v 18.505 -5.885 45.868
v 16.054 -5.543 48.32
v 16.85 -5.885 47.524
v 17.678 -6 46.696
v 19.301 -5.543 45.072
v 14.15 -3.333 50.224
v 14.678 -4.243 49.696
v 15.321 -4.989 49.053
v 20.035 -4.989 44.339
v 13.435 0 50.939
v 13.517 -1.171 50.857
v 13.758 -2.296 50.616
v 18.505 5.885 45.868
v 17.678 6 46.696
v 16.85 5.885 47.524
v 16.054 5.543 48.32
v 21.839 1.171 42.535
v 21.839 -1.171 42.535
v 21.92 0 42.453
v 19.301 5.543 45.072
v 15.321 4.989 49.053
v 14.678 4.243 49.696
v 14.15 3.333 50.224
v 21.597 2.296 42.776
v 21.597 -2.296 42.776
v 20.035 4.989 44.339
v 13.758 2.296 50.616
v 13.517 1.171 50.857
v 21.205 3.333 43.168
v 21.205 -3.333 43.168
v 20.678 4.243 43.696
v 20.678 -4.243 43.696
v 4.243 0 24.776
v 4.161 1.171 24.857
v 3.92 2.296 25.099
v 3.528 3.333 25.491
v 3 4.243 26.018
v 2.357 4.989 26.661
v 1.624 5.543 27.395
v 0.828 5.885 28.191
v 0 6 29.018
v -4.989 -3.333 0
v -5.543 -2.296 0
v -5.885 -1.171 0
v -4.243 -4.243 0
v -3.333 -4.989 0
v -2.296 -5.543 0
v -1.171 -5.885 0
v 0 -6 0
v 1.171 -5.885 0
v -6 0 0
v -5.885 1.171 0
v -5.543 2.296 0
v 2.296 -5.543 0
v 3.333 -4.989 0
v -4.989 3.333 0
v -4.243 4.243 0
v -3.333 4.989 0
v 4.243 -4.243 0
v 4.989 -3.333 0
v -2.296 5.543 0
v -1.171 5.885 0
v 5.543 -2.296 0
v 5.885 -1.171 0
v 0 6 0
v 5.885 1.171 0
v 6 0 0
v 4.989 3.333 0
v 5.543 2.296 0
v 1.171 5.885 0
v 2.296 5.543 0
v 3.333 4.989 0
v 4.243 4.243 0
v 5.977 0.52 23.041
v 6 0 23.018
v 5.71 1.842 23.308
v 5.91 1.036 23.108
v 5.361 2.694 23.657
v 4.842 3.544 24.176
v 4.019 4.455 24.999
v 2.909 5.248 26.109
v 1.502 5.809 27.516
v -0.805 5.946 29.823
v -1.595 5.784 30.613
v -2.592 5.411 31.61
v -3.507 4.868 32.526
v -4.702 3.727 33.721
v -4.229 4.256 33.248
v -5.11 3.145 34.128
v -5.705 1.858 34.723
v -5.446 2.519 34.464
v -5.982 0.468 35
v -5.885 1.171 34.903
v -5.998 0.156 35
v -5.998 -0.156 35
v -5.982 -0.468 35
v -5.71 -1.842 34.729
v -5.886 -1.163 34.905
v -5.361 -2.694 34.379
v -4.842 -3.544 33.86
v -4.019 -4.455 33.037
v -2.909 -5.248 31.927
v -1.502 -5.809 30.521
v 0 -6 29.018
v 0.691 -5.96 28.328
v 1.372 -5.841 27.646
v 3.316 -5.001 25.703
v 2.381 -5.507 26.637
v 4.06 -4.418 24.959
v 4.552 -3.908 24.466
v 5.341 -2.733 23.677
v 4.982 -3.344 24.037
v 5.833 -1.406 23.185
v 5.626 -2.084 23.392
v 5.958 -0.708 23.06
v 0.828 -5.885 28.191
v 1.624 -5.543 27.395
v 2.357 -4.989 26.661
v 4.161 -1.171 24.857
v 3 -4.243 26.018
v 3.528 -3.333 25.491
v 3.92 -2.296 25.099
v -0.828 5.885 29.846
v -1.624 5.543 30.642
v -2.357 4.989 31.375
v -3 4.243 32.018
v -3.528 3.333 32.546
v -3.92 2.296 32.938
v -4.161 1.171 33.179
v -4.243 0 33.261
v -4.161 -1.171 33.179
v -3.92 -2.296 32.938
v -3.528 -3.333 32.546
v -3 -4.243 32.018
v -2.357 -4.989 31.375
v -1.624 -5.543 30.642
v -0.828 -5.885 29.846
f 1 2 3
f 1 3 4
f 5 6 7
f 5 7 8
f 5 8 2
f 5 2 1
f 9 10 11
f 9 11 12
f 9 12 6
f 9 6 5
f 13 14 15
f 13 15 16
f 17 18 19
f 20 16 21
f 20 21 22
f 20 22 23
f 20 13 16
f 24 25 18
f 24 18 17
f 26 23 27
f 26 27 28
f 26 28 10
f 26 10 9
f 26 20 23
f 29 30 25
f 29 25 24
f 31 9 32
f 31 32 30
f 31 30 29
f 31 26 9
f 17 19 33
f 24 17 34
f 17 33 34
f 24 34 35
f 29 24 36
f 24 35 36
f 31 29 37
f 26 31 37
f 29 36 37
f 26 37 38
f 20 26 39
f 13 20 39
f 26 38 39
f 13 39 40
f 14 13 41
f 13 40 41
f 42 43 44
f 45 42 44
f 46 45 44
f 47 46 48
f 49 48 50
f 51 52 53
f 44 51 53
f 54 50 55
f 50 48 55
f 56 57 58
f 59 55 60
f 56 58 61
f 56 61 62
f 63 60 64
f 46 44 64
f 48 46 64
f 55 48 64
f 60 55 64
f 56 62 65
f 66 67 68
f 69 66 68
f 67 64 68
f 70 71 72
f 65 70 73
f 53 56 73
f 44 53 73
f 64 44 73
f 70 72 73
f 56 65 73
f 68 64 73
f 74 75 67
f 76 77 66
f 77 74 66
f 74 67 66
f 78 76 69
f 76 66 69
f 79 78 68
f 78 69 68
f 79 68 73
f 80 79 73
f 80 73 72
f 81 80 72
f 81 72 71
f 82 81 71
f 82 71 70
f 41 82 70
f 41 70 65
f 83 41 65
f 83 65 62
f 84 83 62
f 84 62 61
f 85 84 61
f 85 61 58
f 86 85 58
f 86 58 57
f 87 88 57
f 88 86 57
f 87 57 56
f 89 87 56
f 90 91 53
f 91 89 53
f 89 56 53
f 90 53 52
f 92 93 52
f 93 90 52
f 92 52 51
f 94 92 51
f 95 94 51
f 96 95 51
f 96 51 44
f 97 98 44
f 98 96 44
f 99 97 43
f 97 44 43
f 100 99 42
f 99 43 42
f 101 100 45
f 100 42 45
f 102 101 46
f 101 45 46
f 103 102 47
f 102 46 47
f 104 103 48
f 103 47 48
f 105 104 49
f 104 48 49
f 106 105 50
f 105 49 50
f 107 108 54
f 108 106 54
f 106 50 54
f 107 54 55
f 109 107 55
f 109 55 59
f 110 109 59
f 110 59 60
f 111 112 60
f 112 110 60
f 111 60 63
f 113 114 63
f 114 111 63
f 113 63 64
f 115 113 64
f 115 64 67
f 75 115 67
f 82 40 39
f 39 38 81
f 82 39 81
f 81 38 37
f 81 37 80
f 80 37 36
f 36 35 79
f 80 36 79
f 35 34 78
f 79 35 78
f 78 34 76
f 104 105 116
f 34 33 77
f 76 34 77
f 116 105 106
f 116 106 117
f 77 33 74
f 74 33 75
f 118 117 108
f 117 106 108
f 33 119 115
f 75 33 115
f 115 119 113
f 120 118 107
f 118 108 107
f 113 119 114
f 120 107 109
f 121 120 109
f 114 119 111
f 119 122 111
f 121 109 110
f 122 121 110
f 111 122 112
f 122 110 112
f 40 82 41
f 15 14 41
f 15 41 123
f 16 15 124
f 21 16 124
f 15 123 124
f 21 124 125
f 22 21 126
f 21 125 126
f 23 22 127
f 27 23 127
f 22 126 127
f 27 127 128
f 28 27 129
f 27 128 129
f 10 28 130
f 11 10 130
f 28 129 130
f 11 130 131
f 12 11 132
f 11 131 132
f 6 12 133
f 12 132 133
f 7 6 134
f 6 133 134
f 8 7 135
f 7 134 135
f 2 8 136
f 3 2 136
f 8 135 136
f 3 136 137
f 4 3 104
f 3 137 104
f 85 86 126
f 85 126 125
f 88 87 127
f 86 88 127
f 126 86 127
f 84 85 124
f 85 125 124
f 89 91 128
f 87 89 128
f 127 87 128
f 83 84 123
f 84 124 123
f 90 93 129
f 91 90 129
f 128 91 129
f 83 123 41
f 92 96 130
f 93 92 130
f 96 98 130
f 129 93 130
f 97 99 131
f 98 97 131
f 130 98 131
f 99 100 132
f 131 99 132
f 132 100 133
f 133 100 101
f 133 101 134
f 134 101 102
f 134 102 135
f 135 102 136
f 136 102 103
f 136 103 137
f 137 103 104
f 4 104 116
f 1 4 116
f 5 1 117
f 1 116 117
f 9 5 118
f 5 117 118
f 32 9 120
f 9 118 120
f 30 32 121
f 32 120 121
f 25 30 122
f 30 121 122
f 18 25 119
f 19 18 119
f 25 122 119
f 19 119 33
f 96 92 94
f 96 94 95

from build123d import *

# Parameters (mm, degrees)
F0_R     = 6
F1_DEPTH = 35
F3_DEPTH = 12.5
F5_DEPTH = 25


with BuildPart() as f1:
    # F0 (on Top) → F1 (new body)
    with BuildSketch(Plane.XY):
        Circle(F0_R)
    extrude(amount=F1_DEPTH)

    # F2 (on Front) → F3 (cut, symmetric)
    with BuildSketch(Plane.XZ):
        Polygon((6.1246007681, 35.0653016331), (-6.0470434837, 35.0653016331), (6.1246007681, 22.8936616331), align=None)
    extrude(amount=F3_DEPTH, both=True, mode=Mode.SUBTRACT)

    # F4 (on face) → F5 (join)
    with BuildSketch(Plane(origin=(14.5091301309, 0, 14.5091351992), x_dir=(0.7071069047, 0, -0.7071066577), z_dir=(0.7071066577, 0, 0.7071069047))):
        with BuildLine():
            ThreePointArc((-20.519004735, -6), (-16.2763642357, -4.2426405844), (-14.5190050255, 0))
            ThreePointArc((-14.5190050255, 0), (-16.2763643803, 4.242640729), (-20.519005144, 6))
            ThreePointArc((-20.519005144, 6), (-26.5190050255, -2.045e-07), (-20.519004735, -6))
        make_face()
    extrude(amount=F5_DEPTH)


solid = f1.part
